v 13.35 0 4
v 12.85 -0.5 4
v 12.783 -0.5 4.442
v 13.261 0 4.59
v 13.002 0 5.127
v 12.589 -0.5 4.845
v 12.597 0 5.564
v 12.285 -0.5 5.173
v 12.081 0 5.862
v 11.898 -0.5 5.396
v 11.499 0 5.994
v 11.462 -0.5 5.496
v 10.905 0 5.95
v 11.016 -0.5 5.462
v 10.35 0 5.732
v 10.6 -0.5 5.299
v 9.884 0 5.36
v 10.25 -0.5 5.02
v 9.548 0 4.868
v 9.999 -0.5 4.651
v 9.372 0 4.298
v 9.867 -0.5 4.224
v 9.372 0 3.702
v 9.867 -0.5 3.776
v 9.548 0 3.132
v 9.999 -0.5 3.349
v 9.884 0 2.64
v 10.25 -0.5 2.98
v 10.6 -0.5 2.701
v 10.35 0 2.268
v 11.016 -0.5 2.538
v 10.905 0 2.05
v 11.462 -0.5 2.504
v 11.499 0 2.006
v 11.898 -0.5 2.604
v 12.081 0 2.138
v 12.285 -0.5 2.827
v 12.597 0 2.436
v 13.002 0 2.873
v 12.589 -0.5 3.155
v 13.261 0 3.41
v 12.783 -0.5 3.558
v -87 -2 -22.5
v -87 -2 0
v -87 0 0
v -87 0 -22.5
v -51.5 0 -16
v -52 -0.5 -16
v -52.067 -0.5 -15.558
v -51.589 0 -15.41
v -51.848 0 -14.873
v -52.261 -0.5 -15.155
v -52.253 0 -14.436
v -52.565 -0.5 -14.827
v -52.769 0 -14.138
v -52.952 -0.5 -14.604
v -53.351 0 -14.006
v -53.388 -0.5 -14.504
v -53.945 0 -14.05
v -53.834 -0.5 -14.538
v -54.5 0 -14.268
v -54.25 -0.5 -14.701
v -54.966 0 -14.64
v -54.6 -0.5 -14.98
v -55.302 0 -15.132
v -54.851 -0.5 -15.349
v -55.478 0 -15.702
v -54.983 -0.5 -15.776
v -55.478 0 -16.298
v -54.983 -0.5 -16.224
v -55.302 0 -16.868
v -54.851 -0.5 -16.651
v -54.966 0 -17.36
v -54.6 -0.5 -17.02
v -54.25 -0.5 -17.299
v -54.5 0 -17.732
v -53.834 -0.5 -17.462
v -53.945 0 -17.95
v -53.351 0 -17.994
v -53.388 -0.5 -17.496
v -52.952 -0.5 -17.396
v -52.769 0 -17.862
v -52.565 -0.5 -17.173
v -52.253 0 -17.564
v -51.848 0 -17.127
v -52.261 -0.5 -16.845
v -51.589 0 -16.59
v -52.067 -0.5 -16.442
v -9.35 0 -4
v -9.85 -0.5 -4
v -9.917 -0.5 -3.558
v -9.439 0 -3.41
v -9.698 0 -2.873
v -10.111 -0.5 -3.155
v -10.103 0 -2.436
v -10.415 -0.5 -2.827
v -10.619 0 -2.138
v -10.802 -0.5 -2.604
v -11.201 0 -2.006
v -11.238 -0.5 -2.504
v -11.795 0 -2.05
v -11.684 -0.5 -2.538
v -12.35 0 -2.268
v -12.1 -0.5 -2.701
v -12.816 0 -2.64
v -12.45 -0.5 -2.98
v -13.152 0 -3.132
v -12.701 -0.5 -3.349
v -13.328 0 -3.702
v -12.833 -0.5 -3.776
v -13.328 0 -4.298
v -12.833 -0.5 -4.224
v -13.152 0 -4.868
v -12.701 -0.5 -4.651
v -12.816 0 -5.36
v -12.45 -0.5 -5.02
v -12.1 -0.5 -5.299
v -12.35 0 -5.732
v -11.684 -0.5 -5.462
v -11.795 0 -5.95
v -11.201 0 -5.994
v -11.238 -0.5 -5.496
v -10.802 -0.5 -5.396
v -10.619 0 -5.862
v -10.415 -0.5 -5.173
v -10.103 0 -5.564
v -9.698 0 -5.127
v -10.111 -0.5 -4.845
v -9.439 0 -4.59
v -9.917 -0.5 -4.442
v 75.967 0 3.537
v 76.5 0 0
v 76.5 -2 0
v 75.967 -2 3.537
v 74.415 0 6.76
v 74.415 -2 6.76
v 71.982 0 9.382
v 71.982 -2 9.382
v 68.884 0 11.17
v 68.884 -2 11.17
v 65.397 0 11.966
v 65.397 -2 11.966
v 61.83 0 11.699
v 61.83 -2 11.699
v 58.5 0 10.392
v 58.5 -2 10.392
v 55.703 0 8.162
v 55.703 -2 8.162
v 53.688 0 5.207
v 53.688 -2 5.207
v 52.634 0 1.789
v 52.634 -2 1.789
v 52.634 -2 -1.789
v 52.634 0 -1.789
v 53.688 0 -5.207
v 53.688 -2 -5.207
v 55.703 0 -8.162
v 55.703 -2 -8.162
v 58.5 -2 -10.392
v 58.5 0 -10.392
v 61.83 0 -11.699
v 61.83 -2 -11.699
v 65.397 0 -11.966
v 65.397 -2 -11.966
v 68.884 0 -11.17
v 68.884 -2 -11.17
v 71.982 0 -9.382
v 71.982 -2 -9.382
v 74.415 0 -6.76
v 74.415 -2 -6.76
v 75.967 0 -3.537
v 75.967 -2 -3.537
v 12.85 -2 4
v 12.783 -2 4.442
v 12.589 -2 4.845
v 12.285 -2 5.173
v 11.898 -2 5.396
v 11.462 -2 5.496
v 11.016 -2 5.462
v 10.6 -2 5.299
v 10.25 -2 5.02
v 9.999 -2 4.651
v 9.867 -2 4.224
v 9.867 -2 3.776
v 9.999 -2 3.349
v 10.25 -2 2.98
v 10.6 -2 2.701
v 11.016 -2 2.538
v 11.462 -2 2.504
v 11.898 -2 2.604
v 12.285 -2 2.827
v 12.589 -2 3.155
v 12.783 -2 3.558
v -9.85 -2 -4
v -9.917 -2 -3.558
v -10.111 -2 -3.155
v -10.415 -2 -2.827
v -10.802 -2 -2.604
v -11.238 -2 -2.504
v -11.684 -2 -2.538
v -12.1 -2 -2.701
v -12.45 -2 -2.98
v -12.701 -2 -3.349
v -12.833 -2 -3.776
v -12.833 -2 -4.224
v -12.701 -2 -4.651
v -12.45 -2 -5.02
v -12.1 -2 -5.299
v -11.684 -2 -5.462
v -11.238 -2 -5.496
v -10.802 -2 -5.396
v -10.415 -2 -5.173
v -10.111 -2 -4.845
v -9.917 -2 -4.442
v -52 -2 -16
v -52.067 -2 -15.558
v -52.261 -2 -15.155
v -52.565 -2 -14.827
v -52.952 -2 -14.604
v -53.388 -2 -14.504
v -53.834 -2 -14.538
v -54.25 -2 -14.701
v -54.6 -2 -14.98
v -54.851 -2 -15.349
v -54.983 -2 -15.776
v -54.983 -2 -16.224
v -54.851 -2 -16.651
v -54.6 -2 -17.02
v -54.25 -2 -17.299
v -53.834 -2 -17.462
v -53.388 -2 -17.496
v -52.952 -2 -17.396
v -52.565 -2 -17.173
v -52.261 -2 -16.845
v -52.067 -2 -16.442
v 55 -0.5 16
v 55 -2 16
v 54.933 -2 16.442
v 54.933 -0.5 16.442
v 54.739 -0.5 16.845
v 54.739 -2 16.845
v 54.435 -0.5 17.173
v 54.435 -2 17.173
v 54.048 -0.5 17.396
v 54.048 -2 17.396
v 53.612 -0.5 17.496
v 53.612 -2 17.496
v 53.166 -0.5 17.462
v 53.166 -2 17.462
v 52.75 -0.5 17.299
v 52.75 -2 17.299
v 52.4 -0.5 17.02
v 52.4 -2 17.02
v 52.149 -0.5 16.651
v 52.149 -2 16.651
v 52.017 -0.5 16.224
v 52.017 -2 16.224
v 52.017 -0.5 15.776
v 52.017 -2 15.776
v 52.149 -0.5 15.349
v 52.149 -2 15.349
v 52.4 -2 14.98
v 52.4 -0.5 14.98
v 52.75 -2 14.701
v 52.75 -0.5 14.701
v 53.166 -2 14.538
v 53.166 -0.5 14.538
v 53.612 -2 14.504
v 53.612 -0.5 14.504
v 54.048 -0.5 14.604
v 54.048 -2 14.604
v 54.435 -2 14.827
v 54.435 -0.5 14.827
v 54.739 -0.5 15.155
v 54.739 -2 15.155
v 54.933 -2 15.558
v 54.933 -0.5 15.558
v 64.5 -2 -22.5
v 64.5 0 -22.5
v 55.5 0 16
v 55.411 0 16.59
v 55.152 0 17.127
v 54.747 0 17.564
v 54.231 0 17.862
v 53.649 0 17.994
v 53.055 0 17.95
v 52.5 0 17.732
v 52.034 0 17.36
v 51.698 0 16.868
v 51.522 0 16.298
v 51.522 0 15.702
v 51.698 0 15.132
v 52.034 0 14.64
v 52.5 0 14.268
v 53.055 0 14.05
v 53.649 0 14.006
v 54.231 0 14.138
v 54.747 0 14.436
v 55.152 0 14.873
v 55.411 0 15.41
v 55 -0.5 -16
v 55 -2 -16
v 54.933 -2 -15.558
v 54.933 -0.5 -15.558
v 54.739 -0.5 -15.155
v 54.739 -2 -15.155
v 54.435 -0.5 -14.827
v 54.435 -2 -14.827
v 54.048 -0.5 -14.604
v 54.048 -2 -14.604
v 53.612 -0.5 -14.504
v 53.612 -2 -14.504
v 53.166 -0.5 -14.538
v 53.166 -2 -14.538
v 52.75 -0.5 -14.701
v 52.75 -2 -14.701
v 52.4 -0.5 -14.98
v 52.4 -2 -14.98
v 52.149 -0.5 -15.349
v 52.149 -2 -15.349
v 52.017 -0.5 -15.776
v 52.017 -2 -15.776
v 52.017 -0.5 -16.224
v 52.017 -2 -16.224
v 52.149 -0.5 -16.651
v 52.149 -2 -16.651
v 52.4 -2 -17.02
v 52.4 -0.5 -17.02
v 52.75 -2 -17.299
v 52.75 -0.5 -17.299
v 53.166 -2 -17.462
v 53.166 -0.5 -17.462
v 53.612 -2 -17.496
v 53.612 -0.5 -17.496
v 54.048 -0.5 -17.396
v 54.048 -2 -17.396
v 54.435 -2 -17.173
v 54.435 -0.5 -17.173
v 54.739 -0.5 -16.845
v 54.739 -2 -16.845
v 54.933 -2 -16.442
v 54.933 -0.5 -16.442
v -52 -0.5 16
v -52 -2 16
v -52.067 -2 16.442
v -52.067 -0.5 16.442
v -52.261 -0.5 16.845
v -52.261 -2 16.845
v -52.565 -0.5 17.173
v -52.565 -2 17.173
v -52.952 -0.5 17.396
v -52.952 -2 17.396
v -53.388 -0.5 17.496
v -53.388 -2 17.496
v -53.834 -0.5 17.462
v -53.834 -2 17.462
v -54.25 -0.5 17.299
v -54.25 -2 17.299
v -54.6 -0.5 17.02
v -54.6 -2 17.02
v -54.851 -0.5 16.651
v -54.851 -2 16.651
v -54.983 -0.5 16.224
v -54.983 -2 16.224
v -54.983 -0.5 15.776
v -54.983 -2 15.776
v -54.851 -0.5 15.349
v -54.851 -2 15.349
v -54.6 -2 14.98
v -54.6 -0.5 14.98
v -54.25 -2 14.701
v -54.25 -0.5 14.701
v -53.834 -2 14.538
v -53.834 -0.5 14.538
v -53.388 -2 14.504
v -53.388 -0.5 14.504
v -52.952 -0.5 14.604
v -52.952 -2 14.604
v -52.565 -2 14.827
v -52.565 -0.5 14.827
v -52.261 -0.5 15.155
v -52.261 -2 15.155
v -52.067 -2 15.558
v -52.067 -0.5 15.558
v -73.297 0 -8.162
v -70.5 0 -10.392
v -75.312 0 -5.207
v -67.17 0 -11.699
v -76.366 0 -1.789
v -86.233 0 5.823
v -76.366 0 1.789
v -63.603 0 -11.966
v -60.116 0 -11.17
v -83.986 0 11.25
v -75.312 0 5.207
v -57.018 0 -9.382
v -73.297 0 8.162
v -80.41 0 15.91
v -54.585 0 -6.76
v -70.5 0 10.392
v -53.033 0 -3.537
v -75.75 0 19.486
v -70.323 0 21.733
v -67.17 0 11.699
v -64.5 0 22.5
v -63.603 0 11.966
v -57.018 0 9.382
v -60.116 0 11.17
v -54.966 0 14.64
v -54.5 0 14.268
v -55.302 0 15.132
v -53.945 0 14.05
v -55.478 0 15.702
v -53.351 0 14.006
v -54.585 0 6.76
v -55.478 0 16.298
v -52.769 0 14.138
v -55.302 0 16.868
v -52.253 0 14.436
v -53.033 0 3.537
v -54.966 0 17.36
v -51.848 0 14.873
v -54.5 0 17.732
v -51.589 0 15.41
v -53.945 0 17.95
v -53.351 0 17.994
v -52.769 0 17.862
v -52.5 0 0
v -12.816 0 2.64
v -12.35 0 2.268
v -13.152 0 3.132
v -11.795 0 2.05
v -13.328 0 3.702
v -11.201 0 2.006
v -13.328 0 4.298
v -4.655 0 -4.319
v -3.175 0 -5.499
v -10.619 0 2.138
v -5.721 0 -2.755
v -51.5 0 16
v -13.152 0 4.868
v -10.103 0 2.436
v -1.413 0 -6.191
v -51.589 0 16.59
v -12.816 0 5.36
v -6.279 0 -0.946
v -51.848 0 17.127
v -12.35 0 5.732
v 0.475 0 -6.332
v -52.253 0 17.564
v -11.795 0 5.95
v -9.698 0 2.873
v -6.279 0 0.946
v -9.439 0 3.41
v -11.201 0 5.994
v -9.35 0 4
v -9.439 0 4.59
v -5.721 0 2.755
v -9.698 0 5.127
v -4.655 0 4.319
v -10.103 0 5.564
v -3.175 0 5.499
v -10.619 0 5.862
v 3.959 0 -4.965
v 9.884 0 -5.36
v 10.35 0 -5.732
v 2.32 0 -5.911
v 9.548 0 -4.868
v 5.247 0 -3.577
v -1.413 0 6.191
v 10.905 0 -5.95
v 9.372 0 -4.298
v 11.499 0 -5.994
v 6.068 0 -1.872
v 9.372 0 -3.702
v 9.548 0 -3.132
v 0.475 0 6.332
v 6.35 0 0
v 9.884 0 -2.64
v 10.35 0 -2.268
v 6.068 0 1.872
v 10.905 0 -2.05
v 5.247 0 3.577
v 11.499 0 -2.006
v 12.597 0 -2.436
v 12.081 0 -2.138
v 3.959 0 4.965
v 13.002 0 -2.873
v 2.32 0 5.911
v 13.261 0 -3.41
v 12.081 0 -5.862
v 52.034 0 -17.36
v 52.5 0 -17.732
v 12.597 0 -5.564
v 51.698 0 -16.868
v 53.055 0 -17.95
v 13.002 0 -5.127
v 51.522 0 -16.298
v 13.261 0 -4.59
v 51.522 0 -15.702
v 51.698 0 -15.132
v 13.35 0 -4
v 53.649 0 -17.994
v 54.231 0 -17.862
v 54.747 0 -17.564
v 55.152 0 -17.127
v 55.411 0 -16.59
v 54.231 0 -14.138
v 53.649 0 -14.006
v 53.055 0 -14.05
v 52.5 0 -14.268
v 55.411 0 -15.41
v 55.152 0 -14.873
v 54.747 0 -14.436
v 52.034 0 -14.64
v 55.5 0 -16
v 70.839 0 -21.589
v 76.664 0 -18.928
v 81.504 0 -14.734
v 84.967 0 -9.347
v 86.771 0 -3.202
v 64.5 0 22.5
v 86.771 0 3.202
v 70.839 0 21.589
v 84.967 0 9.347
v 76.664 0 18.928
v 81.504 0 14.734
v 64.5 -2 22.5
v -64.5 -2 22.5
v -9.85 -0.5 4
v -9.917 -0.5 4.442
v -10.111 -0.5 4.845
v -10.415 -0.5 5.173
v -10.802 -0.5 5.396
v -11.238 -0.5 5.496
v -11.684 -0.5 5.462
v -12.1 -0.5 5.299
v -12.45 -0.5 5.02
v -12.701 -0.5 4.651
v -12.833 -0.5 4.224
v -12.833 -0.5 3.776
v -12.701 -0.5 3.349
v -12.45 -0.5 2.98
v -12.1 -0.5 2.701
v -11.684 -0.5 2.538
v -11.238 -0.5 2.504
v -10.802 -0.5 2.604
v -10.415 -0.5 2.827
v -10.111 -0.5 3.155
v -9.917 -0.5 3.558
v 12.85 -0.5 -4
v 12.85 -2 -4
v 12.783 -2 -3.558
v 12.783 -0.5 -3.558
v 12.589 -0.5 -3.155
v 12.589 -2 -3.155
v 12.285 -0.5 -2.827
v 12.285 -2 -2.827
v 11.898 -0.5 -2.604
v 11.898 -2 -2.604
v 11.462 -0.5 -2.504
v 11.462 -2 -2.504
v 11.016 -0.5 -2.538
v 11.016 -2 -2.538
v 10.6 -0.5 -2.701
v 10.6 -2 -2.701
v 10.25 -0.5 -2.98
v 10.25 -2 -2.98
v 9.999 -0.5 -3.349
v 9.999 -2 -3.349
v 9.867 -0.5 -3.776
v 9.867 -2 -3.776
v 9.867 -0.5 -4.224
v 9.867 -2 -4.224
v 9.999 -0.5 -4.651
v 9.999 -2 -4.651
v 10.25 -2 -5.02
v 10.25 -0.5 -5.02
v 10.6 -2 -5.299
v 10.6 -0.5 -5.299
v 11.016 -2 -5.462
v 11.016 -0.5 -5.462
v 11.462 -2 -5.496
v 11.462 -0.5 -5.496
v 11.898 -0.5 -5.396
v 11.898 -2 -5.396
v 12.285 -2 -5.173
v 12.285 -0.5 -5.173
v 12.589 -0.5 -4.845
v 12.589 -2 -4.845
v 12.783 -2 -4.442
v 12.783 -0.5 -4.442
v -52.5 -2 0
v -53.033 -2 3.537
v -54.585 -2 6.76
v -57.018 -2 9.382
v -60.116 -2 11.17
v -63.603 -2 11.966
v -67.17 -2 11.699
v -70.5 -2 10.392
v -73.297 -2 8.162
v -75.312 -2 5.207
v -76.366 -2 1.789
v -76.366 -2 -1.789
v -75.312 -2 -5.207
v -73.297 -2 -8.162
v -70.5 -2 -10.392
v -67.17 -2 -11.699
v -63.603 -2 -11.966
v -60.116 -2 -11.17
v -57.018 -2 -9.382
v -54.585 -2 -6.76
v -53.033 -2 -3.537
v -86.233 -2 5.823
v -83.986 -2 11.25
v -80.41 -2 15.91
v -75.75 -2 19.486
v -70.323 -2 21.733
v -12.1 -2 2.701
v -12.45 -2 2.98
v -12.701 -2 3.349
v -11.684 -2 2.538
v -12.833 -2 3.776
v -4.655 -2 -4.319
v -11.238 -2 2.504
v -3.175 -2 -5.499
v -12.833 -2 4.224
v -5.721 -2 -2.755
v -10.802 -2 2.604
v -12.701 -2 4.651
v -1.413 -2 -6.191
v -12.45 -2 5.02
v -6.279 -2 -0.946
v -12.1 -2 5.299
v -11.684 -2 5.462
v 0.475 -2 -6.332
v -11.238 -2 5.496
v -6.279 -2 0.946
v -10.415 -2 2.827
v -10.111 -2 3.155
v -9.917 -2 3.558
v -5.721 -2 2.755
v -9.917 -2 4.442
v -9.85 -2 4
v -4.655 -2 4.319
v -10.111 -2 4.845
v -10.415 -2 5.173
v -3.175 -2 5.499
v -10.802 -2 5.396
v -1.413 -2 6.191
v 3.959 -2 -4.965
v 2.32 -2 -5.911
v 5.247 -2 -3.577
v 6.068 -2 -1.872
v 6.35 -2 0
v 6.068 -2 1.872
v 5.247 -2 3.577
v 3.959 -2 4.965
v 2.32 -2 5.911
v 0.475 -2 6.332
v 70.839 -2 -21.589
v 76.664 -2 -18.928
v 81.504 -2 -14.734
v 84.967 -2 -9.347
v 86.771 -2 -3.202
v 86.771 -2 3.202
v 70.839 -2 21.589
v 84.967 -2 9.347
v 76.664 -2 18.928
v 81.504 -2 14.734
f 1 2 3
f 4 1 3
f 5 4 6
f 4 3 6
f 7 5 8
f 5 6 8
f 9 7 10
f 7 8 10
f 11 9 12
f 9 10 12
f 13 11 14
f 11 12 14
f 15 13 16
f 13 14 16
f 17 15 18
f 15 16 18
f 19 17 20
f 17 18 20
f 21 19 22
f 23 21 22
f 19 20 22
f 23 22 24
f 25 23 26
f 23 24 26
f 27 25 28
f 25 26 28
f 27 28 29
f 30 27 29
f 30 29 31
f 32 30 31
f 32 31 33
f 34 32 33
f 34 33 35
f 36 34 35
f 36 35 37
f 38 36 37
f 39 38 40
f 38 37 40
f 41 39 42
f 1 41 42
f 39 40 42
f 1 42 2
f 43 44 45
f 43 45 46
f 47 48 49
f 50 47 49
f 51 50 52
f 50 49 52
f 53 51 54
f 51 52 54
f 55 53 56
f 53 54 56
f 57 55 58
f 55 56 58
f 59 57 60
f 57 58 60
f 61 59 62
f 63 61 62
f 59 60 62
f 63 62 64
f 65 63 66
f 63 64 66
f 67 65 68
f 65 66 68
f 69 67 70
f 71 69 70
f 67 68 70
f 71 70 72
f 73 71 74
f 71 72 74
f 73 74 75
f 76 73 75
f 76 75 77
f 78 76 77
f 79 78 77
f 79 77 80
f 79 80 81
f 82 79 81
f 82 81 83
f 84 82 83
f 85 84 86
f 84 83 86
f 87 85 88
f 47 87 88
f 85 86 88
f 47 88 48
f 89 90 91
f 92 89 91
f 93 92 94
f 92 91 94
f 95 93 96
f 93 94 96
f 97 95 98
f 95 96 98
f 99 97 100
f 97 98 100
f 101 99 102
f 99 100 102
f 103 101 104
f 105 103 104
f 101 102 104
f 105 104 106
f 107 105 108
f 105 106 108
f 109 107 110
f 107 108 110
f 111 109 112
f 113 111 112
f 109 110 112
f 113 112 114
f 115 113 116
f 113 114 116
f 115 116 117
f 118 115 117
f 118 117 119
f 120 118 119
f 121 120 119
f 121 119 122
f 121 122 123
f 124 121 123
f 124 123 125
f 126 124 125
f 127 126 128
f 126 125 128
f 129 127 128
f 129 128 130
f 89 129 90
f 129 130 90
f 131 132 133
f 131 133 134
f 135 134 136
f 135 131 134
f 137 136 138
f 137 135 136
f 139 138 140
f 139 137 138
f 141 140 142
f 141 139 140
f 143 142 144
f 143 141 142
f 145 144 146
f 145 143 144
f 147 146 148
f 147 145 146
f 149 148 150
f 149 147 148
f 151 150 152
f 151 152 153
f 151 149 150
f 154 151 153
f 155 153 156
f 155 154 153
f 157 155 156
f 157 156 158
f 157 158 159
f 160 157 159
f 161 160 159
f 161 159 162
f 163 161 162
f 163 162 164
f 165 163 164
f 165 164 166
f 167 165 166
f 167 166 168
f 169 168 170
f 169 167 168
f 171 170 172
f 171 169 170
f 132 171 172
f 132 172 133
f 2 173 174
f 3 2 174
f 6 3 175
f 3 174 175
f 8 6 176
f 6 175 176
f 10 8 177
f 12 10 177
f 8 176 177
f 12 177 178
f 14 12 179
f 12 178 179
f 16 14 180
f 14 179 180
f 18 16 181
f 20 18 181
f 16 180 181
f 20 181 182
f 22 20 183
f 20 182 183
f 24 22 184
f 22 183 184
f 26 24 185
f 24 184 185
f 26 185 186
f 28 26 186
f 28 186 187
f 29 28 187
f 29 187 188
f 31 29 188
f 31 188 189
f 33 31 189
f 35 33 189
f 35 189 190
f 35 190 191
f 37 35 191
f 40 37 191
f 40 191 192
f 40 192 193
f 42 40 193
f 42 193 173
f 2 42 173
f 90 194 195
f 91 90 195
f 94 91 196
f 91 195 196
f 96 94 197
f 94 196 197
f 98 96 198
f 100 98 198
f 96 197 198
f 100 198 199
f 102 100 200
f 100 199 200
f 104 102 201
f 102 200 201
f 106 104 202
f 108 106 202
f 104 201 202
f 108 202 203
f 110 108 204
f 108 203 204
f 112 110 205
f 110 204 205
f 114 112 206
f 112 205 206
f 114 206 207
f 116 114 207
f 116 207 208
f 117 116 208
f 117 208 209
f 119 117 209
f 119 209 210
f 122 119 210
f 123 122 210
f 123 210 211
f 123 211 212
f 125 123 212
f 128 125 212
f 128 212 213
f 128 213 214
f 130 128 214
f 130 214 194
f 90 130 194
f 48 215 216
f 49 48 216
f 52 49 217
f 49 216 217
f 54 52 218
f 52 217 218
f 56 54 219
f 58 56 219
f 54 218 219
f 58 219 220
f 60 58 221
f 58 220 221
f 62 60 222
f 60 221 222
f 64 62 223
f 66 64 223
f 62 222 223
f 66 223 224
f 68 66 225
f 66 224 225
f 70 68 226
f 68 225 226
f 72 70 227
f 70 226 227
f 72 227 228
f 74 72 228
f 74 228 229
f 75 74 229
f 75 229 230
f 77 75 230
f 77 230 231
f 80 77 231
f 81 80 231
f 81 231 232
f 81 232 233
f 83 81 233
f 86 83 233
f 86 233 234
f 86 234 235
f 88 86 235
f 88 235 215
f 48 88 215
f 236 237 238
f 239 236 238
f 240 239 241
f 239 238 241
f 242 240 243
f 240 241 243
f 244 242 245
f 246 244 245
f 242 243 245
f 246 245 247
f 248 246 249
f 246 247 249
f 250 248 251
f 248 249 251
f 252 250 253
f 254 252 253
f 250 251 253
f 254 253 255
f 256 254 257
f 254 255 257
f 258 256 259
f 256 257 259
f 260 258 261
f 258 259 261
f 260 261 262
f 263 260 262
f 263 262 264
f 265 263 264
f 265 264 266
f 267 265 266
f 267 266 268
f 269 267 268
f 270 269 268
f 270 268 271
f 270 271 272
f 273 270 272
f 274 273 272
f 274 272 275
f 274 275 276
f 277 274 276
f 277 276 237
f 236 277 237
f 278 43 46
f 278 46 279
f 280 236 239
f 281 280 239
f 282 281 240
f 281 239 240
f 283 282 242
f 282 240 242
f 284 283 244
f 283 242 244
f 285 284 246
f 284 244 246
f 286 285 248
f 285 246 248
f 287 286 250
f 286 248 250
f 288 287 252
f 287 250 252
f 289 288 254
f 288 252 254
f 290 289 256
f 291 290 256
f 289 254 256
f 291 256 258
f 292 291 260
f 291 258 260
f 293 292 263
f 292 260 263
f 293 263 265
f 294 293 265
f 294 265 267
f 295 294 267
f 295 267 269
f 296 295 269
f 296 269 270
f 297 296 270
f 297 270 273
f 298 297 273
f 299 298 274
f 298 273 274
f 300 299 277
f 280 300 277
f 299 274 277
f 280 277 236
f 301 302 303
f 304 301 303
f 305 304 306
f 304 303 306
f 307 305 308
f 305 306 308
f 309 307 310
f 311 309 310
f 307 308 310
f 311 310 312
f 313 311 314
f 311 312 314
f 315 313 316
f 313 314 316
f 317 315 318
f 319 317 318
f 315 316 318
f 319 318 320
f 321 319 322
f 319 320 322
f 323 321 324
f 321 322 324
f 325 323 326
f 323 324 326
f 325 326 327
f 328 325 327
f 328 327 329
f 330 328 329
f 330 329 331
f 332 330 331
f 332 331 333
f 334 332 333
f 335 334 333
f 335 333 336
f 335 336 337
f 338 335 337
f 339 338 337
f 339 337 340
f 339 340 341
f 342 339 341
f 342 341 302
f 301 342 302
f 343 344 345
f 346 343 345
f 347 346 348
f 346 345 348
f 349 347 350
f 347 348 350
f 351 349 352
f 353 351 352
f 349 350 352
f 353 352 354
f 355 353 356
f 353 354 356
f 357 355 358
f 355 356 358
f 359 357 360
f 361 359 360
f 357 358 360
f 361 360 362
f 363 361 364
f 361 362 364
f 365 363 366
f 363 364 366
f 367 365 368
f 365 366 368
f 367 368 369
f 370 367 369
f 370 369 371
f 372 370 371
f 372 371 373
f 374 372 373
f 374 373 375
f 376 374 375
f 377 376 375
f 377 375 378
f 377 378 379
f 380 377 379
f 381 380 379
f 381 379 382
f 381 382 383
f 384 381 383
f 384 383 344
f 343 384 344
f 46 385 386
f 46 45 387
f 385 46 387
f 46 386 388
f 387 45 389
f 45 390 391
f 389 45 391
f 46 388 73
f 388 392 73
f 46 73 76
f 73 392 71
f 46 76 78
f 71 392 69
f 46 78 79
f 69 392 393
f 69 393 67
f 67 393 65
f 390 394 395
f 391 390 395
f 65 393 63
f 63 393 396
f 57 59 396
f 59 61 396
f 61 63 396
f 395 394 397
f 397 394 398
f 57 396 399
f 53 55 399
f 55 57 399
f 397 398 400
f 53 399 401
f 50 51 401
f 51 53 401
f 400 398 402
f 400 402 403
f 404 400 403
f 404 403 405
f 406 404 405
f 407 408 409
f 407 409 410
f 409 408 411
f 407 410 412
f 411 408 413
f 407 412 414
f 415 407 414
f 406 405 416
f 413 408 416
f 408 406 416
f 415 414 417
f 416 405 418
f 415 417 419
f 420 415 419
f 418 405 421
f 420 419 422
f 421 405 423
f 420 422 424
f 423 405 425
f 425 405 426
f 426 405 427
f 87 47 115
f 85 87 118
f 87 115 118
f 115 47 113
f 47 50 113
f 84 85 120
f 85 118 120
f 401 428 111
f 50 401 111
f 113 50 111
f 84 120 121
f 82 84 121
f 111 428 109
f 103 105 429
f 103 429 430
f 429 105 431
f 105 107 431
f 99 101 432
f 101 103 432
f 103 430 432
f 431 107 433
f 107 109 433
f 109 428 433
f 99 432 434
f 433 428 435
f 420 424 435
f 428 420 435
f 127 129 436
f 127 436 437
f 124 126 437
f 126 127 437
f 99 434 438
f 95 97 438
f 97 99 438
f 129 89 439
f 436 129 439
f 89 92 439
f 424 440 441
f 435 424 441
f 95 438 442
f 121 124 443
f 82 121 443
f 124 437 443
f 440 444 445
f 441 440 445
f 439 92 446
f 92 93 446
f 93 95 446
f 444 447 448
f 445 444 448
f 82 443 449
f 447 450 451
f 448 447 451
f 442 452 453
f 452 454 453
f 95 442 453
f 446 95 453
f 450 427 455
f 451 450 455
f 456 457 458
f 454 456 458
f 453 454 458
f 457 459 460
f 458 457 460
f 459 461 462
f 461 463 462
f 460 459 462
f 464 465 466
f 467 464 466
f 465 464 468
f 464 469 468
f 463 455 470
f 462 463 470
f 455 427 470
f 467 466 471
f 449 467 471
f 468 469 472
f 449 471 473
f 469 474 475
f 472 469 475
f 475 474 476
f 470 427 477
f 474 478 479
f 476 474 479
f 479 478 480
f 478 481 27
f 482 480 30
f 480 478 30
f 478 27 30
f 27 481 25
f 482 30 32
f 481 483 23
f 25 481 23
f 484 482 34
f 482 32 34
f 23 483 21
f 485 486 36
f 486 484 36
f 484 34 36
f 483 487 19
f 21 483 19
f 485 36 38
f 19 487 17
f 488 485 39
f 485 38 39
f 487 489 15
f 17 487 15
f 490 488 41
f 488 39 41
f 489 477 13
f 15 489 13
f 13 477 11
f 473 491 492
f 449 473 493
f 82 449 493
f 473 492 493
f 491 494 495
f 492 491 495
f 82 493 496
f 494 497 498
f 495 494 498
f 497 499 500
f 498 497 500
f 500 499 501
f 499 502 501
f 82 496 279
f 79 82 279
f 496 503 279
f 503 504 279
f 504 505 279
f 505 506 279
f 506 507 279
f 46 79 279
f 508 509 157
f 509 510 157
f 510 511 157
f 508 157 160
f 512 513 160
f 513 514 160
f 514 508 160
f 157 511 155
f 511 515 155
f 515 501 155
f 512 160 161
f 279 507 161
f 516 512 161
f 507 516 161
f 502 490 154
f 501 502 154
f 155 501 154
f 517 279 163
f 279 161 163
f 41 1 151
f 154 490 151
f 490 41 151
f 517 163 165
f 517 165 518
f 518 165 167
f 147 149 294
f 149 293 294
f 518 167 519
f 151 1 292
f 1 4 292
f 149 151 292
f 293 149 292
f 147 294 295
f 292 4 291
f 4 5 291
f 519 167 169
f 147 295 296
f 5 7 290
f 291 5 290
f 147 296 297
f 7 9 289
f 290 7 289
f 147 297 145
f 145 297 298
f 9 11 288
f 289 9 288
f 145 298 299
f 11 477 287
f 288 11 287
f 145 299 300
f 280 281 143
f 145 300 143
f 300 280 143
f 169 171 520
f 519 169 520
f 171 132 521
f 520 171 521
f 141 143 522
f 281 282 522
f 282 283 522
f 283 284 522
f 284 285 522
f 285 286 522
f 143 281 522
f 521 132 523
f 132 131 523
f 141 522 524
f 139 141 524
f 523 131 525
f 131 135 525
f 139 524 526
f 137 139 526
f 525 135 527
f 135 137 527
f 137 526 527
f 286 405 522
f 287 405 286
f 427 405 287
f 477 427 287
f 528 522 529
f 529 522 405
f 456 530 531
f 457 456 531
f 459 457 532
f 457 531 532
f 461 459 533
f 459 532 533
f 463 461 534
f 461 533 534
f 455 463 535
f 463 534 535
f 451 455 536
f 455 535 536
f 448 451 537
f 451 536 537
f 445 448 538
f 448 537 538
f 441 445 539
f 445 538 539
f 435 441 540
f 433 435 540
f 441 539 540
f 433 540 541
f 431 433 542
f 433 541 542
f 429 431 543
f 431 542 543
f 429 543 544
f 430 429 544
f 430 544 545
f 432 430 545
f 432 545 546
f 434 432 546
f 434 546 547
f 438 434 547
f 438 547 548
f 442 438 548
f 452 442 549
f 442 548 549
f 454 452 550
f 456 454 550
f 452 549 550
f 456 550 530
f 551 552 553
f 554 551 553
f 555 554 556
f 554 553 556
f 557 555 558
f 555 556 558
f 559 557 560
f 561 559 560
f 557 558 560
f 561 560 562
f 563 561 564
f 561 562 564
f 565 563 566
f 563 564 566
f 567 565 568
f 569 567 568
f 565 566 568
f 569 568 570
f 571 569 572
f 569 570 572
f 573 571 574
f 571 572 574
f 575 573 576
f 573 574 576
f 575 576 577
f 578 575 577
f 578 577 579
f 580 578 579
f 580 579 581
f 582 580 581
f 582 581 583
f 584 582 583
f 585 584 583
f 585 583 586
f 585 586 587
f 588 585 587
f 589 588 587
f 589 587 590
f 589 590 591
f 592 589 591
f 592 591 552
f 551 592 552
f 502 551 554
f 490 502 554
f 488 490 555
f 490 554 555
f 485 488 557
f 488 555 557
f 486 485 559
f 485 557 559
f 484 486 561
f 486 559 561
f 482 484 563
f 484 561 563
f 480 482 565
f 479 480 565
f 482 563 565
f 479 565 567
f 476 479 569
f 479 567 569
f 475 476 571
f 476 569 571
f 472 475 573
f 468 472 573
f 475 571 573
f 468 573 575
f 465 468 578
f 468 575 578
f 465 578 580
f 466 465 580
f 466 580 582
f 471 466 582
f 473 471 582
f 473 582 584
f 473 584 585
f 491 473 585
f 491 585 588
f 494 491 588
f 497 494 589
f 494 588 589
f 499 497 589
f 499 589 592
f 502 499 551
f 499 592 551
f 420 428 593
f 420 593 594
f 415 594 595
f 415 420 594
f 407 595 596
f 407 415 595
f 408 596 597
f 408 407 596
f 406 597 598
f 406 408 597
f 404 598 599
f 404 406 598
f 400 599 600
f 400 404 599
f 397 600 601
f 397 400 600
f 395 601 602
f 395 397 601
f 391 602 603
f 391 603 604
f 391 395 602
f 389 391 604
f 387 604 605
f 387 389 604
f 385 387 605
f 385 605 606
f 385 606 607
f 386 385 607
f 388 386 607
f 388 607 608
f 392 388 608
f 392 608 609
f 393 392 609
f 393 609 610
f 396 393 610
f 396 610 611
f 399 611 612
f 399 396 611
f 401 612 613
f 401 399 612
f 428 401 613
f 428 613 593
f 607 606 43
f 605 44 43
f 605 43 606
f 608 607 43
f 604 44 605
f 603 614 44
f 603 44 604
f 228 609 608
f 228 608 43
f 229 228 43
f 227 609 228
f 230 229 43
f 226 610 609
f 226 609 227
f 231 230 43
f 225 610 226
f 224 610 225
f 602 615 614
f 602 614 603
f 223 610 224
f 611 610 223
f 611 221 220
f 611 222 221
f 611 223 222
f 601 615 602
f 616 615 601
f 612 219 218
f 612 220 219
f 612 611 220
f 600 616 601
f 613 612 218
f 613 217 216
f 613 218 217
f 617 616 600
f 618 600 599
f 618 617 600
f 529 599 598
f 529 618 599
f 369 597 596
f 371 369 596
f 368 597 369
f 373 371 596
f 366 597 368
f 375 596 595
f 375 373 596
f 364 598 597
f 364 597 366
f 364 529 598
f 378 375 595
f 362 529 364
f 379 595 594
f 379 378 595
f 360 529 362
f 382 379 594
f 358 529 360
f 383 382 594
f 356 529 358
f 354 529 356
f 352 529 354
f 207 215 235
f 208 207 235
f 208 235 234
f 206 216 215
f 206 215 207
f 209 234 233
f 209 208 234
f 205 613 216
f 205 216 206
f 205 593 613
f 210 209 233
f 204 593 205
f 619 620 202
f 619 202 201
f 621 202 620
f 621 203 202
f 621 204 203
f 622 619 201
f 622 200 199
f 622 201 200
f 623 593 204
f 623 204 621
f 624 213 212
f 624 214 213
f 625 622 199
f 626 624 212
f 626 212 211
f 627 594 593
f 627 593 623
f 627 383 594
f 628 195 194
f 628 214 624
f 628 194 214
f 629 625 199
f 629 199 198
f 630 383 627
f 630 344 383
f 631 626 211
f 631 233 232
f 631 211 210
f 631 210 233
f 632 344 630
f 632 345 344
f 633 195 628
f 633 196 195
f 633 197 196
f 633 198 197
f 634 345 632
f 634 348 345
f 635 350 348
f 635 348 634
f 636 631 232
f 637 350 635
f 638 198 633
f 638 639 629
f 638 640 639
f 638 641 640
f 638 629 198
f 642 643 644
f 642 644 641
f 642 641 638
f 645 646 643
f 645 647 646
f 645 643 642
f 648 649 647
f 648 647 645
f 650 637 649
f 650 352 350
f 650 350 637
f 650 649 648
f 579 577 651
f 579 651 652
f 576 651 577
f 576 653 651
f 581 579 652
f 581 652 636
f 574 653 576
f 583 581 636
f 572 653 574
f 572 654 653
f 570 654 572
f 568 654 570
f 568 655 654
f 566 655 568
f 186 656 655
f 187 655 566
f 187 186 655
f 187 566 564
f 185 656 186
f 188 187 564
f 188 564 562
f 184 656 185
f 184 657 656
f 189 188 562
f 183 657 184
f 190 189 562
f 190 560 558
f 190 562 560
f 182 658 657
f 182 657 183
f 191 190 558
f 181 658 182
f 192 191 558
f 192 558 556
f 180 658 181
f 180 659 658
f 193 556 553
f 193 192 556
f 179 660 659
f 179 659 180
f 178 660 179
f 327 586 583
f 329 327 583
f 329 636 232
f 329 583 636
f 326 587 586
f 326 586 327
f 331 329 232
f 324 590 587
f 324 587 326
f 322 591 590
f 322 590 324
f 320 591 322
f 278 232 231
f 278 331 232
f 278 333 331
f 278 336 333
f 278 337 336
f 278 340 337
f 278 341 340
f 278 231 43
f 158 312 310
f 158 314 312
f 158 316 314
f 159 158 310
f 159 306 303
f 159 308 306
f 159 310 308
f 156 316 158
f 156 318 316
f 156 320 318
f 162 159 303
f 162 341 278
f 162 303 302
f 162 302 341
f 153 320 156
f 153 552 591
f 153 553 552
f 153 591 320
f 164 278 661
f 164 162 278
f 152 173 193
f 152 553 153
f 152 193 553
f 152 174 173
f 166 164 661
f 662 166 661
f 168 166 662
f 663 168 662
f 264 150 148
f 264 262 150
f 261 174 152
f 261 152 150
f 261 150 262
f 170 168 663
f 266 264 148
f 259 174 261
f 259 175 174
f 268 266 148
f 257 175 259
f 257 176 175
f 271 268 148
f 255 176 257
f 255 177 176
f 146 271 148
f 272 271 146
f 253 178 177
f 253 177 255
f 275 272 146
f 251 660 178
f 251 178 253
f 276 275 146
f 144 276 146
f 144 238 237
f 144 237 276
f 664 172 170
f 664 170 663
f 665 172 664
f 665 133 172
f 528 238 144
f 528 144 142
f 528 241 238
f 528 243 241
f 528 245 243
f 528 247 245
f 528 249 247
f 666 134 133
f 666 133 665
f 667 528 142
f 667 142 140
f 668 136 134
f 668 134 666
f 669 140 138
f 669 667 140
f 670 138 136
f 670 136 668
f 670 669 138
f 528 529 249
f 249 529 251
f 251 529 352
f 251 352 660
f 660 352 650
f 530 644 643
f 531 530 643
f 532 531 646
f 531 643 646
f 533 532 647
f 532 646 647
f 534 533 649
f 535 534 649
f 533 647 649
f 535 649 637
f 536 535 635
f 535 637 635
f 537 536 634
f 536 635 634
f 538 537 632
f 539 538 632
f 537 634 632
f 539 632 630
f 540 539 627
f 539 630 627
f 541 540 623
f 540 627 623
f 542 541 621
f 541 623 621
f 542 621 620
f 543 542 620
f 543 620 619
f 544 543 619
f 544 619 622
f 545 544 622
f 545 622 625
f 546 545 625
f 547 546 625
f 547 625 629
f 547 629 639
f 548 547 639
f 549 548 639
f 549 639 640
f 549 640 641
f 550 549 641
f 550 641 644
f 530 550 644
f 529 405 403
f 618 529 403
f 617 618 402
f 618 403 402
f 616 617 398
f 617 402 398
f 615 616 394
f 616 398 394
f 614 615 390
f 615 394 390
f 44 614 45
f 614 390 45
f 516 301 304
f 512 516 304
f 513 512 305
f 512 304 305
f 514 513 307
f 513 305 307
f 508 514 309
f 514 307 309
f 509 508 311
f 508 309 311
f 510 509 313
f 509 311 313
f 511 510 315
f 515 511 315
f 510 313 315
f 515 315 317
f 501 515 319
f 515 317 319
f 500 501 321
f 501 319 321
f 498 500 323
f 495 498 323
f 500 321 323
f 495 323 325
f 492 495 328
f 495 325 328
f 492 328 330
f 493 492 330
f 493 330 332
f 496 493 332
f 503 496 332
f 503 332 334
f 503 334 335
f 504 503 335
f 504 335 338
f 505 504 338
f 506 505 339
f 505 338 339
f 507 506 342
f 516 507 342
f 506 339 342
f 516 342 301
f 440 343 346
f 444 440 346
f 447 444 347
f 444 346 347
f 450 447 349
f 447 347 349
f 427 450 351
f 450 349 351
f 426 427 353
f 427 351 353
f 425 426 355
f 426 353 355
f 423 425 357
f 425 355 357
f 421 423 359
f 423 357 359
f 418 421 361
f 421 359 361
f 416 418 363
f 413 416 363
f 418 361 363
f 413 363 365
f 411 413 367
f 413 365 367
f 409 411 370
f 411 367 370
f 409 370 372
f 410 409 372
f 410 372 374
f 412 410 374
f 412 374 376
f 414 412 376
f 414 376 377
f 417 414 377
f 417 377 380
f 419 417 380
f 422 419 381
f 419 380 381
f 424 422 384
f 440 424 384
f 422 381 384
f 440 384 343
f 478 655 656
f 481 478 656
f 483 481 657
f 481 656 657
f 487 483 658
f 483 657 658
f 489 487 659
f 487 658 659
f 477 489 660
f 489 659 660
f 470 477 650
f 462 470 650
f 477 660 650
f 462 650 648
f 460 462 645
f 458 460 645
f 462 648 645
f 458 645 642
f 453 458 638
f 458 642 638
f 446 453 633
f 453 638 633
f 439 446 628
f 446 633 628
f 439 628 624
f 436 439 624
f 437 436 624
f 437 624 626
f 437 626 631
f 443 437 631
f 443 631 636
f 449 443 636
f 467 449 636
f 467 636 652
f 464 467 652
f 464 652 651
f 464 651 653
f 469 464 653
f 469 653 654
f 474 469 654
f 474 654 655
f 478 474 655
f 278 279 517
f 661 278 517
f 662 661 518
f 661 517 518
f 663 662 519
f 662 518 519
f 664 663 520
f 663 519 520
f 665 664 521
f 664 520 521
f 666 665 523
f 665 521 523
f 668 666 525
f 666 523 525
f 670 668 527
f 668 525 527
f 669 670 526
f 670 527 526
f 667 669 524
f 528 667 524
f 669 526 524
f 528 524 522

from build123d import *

# Parameters (mm, degrees)
F0_R      = 12
F1_DEPTH  = 2
F3_DEPTH  = 2
F4_R      = 1.5
F5_DEPTH  = 25
F6_SIZE   = 0.5
F7_R      = 6.35
F8_DEPTH  = 25
F9_R      = 1.5
F10_DEPTH = 25
F11_SIZE  = 0.5


with BuildPart() as f1:
    # F0 (on Front) → F1 (new body)
    with BuildSketch(Plane.XZ):
        with BuildLine():
            ThreePointArc((64.5, -22.5), (87, 0), (64.5, 22.5))
            Line((64.5, 22.5), (-64.5, 22.5))
            ThreePointArc((-64.5, 22.5), (-87, 0), (-64.5, -22.5))
            Line((-64.5, -22.5), (64.5, -22.5))
        make_face()
        with Locations((-64.5, 0)):
            Circle(F0_R, mode=Mode.SUBTRACT)
        with Locations((64.5, 0)):
            Circle(F0_R, mode=Mode.SUBTRACT)
    extrude(amount=F1_DEPTH)

    # F2 (on face) → F3 (join)
    with BuildSketch(Plane.XZ.offset(2)):
        Polygon((-87, -22.5), (-64.5, -22.5), (-64.5, -17.4313578755), (-70.5482587218, -14.7617282346), (-78.2682448626, -9.4630774111), (-80.8771923184, 0), (-87, 0), align=None)
    extrude(amount=-F3_DEPTH)

    # F4 (on face) → F5 (cut)
    with BuildSketch(Plane.XZ.offset(2)):
        with Locations((-53.5, 16)):
            Circle(F4_R)
        with Locations((-53.5, -16)):
            Circle(F4_R)
        with Locations((53.5, 16)):
            Circle(F4_R)
        with Locations((53.5, -16)):
            Circle(F4_R)
    extrude(amount=-F5_DEPTH, mode=Mode.SUBTRACT)

    # F6
    f6_edges = [f1.edges().sort_by_distance(p)[0] for p in [
        (-55, 0, 16),
        (-55, 0, -16),
        (52, 0, 16),
        (52, 0, -16),
    ]]
    chamfer(f6_edges, length=F6_SIZE)

    # F7 (on face) → F8 (cut)
    with BuildSketch(Plane.XZ.offset(2)):
        Circle(F7_R)
    extrude(amount=-F8_DEPTH, mode=Mode.SUBTRACT)

    # F9 (on face) → F10 (cut)
    with BuildSketch(Plane.XZ.offset(2)):
        with Locations((-11.35, 4)):
            Circle(F9_R)
        with Locations((-11.35, -4)):
            Circle(F9_R)
        with Locations((11.35, 4)):
            Circle(F9_R)
        with Locations((11.35, -4)):
            Circle(F9_R)
    extrude(amount=-F10_DEPTH, mode=Mode.SUBTRACT)

    # F11
    f11_edges = [f1.edges().sort_by_distance(p)[0] for p in [
        (-12.85, 0, 4),
        (-12.85, 0, -4),
        (9.85, 0, -4),
        (9.85, 0, 4),
    ]]
    chamfer(f11_edges, length=F11_SIZE)


solid = f1.part
